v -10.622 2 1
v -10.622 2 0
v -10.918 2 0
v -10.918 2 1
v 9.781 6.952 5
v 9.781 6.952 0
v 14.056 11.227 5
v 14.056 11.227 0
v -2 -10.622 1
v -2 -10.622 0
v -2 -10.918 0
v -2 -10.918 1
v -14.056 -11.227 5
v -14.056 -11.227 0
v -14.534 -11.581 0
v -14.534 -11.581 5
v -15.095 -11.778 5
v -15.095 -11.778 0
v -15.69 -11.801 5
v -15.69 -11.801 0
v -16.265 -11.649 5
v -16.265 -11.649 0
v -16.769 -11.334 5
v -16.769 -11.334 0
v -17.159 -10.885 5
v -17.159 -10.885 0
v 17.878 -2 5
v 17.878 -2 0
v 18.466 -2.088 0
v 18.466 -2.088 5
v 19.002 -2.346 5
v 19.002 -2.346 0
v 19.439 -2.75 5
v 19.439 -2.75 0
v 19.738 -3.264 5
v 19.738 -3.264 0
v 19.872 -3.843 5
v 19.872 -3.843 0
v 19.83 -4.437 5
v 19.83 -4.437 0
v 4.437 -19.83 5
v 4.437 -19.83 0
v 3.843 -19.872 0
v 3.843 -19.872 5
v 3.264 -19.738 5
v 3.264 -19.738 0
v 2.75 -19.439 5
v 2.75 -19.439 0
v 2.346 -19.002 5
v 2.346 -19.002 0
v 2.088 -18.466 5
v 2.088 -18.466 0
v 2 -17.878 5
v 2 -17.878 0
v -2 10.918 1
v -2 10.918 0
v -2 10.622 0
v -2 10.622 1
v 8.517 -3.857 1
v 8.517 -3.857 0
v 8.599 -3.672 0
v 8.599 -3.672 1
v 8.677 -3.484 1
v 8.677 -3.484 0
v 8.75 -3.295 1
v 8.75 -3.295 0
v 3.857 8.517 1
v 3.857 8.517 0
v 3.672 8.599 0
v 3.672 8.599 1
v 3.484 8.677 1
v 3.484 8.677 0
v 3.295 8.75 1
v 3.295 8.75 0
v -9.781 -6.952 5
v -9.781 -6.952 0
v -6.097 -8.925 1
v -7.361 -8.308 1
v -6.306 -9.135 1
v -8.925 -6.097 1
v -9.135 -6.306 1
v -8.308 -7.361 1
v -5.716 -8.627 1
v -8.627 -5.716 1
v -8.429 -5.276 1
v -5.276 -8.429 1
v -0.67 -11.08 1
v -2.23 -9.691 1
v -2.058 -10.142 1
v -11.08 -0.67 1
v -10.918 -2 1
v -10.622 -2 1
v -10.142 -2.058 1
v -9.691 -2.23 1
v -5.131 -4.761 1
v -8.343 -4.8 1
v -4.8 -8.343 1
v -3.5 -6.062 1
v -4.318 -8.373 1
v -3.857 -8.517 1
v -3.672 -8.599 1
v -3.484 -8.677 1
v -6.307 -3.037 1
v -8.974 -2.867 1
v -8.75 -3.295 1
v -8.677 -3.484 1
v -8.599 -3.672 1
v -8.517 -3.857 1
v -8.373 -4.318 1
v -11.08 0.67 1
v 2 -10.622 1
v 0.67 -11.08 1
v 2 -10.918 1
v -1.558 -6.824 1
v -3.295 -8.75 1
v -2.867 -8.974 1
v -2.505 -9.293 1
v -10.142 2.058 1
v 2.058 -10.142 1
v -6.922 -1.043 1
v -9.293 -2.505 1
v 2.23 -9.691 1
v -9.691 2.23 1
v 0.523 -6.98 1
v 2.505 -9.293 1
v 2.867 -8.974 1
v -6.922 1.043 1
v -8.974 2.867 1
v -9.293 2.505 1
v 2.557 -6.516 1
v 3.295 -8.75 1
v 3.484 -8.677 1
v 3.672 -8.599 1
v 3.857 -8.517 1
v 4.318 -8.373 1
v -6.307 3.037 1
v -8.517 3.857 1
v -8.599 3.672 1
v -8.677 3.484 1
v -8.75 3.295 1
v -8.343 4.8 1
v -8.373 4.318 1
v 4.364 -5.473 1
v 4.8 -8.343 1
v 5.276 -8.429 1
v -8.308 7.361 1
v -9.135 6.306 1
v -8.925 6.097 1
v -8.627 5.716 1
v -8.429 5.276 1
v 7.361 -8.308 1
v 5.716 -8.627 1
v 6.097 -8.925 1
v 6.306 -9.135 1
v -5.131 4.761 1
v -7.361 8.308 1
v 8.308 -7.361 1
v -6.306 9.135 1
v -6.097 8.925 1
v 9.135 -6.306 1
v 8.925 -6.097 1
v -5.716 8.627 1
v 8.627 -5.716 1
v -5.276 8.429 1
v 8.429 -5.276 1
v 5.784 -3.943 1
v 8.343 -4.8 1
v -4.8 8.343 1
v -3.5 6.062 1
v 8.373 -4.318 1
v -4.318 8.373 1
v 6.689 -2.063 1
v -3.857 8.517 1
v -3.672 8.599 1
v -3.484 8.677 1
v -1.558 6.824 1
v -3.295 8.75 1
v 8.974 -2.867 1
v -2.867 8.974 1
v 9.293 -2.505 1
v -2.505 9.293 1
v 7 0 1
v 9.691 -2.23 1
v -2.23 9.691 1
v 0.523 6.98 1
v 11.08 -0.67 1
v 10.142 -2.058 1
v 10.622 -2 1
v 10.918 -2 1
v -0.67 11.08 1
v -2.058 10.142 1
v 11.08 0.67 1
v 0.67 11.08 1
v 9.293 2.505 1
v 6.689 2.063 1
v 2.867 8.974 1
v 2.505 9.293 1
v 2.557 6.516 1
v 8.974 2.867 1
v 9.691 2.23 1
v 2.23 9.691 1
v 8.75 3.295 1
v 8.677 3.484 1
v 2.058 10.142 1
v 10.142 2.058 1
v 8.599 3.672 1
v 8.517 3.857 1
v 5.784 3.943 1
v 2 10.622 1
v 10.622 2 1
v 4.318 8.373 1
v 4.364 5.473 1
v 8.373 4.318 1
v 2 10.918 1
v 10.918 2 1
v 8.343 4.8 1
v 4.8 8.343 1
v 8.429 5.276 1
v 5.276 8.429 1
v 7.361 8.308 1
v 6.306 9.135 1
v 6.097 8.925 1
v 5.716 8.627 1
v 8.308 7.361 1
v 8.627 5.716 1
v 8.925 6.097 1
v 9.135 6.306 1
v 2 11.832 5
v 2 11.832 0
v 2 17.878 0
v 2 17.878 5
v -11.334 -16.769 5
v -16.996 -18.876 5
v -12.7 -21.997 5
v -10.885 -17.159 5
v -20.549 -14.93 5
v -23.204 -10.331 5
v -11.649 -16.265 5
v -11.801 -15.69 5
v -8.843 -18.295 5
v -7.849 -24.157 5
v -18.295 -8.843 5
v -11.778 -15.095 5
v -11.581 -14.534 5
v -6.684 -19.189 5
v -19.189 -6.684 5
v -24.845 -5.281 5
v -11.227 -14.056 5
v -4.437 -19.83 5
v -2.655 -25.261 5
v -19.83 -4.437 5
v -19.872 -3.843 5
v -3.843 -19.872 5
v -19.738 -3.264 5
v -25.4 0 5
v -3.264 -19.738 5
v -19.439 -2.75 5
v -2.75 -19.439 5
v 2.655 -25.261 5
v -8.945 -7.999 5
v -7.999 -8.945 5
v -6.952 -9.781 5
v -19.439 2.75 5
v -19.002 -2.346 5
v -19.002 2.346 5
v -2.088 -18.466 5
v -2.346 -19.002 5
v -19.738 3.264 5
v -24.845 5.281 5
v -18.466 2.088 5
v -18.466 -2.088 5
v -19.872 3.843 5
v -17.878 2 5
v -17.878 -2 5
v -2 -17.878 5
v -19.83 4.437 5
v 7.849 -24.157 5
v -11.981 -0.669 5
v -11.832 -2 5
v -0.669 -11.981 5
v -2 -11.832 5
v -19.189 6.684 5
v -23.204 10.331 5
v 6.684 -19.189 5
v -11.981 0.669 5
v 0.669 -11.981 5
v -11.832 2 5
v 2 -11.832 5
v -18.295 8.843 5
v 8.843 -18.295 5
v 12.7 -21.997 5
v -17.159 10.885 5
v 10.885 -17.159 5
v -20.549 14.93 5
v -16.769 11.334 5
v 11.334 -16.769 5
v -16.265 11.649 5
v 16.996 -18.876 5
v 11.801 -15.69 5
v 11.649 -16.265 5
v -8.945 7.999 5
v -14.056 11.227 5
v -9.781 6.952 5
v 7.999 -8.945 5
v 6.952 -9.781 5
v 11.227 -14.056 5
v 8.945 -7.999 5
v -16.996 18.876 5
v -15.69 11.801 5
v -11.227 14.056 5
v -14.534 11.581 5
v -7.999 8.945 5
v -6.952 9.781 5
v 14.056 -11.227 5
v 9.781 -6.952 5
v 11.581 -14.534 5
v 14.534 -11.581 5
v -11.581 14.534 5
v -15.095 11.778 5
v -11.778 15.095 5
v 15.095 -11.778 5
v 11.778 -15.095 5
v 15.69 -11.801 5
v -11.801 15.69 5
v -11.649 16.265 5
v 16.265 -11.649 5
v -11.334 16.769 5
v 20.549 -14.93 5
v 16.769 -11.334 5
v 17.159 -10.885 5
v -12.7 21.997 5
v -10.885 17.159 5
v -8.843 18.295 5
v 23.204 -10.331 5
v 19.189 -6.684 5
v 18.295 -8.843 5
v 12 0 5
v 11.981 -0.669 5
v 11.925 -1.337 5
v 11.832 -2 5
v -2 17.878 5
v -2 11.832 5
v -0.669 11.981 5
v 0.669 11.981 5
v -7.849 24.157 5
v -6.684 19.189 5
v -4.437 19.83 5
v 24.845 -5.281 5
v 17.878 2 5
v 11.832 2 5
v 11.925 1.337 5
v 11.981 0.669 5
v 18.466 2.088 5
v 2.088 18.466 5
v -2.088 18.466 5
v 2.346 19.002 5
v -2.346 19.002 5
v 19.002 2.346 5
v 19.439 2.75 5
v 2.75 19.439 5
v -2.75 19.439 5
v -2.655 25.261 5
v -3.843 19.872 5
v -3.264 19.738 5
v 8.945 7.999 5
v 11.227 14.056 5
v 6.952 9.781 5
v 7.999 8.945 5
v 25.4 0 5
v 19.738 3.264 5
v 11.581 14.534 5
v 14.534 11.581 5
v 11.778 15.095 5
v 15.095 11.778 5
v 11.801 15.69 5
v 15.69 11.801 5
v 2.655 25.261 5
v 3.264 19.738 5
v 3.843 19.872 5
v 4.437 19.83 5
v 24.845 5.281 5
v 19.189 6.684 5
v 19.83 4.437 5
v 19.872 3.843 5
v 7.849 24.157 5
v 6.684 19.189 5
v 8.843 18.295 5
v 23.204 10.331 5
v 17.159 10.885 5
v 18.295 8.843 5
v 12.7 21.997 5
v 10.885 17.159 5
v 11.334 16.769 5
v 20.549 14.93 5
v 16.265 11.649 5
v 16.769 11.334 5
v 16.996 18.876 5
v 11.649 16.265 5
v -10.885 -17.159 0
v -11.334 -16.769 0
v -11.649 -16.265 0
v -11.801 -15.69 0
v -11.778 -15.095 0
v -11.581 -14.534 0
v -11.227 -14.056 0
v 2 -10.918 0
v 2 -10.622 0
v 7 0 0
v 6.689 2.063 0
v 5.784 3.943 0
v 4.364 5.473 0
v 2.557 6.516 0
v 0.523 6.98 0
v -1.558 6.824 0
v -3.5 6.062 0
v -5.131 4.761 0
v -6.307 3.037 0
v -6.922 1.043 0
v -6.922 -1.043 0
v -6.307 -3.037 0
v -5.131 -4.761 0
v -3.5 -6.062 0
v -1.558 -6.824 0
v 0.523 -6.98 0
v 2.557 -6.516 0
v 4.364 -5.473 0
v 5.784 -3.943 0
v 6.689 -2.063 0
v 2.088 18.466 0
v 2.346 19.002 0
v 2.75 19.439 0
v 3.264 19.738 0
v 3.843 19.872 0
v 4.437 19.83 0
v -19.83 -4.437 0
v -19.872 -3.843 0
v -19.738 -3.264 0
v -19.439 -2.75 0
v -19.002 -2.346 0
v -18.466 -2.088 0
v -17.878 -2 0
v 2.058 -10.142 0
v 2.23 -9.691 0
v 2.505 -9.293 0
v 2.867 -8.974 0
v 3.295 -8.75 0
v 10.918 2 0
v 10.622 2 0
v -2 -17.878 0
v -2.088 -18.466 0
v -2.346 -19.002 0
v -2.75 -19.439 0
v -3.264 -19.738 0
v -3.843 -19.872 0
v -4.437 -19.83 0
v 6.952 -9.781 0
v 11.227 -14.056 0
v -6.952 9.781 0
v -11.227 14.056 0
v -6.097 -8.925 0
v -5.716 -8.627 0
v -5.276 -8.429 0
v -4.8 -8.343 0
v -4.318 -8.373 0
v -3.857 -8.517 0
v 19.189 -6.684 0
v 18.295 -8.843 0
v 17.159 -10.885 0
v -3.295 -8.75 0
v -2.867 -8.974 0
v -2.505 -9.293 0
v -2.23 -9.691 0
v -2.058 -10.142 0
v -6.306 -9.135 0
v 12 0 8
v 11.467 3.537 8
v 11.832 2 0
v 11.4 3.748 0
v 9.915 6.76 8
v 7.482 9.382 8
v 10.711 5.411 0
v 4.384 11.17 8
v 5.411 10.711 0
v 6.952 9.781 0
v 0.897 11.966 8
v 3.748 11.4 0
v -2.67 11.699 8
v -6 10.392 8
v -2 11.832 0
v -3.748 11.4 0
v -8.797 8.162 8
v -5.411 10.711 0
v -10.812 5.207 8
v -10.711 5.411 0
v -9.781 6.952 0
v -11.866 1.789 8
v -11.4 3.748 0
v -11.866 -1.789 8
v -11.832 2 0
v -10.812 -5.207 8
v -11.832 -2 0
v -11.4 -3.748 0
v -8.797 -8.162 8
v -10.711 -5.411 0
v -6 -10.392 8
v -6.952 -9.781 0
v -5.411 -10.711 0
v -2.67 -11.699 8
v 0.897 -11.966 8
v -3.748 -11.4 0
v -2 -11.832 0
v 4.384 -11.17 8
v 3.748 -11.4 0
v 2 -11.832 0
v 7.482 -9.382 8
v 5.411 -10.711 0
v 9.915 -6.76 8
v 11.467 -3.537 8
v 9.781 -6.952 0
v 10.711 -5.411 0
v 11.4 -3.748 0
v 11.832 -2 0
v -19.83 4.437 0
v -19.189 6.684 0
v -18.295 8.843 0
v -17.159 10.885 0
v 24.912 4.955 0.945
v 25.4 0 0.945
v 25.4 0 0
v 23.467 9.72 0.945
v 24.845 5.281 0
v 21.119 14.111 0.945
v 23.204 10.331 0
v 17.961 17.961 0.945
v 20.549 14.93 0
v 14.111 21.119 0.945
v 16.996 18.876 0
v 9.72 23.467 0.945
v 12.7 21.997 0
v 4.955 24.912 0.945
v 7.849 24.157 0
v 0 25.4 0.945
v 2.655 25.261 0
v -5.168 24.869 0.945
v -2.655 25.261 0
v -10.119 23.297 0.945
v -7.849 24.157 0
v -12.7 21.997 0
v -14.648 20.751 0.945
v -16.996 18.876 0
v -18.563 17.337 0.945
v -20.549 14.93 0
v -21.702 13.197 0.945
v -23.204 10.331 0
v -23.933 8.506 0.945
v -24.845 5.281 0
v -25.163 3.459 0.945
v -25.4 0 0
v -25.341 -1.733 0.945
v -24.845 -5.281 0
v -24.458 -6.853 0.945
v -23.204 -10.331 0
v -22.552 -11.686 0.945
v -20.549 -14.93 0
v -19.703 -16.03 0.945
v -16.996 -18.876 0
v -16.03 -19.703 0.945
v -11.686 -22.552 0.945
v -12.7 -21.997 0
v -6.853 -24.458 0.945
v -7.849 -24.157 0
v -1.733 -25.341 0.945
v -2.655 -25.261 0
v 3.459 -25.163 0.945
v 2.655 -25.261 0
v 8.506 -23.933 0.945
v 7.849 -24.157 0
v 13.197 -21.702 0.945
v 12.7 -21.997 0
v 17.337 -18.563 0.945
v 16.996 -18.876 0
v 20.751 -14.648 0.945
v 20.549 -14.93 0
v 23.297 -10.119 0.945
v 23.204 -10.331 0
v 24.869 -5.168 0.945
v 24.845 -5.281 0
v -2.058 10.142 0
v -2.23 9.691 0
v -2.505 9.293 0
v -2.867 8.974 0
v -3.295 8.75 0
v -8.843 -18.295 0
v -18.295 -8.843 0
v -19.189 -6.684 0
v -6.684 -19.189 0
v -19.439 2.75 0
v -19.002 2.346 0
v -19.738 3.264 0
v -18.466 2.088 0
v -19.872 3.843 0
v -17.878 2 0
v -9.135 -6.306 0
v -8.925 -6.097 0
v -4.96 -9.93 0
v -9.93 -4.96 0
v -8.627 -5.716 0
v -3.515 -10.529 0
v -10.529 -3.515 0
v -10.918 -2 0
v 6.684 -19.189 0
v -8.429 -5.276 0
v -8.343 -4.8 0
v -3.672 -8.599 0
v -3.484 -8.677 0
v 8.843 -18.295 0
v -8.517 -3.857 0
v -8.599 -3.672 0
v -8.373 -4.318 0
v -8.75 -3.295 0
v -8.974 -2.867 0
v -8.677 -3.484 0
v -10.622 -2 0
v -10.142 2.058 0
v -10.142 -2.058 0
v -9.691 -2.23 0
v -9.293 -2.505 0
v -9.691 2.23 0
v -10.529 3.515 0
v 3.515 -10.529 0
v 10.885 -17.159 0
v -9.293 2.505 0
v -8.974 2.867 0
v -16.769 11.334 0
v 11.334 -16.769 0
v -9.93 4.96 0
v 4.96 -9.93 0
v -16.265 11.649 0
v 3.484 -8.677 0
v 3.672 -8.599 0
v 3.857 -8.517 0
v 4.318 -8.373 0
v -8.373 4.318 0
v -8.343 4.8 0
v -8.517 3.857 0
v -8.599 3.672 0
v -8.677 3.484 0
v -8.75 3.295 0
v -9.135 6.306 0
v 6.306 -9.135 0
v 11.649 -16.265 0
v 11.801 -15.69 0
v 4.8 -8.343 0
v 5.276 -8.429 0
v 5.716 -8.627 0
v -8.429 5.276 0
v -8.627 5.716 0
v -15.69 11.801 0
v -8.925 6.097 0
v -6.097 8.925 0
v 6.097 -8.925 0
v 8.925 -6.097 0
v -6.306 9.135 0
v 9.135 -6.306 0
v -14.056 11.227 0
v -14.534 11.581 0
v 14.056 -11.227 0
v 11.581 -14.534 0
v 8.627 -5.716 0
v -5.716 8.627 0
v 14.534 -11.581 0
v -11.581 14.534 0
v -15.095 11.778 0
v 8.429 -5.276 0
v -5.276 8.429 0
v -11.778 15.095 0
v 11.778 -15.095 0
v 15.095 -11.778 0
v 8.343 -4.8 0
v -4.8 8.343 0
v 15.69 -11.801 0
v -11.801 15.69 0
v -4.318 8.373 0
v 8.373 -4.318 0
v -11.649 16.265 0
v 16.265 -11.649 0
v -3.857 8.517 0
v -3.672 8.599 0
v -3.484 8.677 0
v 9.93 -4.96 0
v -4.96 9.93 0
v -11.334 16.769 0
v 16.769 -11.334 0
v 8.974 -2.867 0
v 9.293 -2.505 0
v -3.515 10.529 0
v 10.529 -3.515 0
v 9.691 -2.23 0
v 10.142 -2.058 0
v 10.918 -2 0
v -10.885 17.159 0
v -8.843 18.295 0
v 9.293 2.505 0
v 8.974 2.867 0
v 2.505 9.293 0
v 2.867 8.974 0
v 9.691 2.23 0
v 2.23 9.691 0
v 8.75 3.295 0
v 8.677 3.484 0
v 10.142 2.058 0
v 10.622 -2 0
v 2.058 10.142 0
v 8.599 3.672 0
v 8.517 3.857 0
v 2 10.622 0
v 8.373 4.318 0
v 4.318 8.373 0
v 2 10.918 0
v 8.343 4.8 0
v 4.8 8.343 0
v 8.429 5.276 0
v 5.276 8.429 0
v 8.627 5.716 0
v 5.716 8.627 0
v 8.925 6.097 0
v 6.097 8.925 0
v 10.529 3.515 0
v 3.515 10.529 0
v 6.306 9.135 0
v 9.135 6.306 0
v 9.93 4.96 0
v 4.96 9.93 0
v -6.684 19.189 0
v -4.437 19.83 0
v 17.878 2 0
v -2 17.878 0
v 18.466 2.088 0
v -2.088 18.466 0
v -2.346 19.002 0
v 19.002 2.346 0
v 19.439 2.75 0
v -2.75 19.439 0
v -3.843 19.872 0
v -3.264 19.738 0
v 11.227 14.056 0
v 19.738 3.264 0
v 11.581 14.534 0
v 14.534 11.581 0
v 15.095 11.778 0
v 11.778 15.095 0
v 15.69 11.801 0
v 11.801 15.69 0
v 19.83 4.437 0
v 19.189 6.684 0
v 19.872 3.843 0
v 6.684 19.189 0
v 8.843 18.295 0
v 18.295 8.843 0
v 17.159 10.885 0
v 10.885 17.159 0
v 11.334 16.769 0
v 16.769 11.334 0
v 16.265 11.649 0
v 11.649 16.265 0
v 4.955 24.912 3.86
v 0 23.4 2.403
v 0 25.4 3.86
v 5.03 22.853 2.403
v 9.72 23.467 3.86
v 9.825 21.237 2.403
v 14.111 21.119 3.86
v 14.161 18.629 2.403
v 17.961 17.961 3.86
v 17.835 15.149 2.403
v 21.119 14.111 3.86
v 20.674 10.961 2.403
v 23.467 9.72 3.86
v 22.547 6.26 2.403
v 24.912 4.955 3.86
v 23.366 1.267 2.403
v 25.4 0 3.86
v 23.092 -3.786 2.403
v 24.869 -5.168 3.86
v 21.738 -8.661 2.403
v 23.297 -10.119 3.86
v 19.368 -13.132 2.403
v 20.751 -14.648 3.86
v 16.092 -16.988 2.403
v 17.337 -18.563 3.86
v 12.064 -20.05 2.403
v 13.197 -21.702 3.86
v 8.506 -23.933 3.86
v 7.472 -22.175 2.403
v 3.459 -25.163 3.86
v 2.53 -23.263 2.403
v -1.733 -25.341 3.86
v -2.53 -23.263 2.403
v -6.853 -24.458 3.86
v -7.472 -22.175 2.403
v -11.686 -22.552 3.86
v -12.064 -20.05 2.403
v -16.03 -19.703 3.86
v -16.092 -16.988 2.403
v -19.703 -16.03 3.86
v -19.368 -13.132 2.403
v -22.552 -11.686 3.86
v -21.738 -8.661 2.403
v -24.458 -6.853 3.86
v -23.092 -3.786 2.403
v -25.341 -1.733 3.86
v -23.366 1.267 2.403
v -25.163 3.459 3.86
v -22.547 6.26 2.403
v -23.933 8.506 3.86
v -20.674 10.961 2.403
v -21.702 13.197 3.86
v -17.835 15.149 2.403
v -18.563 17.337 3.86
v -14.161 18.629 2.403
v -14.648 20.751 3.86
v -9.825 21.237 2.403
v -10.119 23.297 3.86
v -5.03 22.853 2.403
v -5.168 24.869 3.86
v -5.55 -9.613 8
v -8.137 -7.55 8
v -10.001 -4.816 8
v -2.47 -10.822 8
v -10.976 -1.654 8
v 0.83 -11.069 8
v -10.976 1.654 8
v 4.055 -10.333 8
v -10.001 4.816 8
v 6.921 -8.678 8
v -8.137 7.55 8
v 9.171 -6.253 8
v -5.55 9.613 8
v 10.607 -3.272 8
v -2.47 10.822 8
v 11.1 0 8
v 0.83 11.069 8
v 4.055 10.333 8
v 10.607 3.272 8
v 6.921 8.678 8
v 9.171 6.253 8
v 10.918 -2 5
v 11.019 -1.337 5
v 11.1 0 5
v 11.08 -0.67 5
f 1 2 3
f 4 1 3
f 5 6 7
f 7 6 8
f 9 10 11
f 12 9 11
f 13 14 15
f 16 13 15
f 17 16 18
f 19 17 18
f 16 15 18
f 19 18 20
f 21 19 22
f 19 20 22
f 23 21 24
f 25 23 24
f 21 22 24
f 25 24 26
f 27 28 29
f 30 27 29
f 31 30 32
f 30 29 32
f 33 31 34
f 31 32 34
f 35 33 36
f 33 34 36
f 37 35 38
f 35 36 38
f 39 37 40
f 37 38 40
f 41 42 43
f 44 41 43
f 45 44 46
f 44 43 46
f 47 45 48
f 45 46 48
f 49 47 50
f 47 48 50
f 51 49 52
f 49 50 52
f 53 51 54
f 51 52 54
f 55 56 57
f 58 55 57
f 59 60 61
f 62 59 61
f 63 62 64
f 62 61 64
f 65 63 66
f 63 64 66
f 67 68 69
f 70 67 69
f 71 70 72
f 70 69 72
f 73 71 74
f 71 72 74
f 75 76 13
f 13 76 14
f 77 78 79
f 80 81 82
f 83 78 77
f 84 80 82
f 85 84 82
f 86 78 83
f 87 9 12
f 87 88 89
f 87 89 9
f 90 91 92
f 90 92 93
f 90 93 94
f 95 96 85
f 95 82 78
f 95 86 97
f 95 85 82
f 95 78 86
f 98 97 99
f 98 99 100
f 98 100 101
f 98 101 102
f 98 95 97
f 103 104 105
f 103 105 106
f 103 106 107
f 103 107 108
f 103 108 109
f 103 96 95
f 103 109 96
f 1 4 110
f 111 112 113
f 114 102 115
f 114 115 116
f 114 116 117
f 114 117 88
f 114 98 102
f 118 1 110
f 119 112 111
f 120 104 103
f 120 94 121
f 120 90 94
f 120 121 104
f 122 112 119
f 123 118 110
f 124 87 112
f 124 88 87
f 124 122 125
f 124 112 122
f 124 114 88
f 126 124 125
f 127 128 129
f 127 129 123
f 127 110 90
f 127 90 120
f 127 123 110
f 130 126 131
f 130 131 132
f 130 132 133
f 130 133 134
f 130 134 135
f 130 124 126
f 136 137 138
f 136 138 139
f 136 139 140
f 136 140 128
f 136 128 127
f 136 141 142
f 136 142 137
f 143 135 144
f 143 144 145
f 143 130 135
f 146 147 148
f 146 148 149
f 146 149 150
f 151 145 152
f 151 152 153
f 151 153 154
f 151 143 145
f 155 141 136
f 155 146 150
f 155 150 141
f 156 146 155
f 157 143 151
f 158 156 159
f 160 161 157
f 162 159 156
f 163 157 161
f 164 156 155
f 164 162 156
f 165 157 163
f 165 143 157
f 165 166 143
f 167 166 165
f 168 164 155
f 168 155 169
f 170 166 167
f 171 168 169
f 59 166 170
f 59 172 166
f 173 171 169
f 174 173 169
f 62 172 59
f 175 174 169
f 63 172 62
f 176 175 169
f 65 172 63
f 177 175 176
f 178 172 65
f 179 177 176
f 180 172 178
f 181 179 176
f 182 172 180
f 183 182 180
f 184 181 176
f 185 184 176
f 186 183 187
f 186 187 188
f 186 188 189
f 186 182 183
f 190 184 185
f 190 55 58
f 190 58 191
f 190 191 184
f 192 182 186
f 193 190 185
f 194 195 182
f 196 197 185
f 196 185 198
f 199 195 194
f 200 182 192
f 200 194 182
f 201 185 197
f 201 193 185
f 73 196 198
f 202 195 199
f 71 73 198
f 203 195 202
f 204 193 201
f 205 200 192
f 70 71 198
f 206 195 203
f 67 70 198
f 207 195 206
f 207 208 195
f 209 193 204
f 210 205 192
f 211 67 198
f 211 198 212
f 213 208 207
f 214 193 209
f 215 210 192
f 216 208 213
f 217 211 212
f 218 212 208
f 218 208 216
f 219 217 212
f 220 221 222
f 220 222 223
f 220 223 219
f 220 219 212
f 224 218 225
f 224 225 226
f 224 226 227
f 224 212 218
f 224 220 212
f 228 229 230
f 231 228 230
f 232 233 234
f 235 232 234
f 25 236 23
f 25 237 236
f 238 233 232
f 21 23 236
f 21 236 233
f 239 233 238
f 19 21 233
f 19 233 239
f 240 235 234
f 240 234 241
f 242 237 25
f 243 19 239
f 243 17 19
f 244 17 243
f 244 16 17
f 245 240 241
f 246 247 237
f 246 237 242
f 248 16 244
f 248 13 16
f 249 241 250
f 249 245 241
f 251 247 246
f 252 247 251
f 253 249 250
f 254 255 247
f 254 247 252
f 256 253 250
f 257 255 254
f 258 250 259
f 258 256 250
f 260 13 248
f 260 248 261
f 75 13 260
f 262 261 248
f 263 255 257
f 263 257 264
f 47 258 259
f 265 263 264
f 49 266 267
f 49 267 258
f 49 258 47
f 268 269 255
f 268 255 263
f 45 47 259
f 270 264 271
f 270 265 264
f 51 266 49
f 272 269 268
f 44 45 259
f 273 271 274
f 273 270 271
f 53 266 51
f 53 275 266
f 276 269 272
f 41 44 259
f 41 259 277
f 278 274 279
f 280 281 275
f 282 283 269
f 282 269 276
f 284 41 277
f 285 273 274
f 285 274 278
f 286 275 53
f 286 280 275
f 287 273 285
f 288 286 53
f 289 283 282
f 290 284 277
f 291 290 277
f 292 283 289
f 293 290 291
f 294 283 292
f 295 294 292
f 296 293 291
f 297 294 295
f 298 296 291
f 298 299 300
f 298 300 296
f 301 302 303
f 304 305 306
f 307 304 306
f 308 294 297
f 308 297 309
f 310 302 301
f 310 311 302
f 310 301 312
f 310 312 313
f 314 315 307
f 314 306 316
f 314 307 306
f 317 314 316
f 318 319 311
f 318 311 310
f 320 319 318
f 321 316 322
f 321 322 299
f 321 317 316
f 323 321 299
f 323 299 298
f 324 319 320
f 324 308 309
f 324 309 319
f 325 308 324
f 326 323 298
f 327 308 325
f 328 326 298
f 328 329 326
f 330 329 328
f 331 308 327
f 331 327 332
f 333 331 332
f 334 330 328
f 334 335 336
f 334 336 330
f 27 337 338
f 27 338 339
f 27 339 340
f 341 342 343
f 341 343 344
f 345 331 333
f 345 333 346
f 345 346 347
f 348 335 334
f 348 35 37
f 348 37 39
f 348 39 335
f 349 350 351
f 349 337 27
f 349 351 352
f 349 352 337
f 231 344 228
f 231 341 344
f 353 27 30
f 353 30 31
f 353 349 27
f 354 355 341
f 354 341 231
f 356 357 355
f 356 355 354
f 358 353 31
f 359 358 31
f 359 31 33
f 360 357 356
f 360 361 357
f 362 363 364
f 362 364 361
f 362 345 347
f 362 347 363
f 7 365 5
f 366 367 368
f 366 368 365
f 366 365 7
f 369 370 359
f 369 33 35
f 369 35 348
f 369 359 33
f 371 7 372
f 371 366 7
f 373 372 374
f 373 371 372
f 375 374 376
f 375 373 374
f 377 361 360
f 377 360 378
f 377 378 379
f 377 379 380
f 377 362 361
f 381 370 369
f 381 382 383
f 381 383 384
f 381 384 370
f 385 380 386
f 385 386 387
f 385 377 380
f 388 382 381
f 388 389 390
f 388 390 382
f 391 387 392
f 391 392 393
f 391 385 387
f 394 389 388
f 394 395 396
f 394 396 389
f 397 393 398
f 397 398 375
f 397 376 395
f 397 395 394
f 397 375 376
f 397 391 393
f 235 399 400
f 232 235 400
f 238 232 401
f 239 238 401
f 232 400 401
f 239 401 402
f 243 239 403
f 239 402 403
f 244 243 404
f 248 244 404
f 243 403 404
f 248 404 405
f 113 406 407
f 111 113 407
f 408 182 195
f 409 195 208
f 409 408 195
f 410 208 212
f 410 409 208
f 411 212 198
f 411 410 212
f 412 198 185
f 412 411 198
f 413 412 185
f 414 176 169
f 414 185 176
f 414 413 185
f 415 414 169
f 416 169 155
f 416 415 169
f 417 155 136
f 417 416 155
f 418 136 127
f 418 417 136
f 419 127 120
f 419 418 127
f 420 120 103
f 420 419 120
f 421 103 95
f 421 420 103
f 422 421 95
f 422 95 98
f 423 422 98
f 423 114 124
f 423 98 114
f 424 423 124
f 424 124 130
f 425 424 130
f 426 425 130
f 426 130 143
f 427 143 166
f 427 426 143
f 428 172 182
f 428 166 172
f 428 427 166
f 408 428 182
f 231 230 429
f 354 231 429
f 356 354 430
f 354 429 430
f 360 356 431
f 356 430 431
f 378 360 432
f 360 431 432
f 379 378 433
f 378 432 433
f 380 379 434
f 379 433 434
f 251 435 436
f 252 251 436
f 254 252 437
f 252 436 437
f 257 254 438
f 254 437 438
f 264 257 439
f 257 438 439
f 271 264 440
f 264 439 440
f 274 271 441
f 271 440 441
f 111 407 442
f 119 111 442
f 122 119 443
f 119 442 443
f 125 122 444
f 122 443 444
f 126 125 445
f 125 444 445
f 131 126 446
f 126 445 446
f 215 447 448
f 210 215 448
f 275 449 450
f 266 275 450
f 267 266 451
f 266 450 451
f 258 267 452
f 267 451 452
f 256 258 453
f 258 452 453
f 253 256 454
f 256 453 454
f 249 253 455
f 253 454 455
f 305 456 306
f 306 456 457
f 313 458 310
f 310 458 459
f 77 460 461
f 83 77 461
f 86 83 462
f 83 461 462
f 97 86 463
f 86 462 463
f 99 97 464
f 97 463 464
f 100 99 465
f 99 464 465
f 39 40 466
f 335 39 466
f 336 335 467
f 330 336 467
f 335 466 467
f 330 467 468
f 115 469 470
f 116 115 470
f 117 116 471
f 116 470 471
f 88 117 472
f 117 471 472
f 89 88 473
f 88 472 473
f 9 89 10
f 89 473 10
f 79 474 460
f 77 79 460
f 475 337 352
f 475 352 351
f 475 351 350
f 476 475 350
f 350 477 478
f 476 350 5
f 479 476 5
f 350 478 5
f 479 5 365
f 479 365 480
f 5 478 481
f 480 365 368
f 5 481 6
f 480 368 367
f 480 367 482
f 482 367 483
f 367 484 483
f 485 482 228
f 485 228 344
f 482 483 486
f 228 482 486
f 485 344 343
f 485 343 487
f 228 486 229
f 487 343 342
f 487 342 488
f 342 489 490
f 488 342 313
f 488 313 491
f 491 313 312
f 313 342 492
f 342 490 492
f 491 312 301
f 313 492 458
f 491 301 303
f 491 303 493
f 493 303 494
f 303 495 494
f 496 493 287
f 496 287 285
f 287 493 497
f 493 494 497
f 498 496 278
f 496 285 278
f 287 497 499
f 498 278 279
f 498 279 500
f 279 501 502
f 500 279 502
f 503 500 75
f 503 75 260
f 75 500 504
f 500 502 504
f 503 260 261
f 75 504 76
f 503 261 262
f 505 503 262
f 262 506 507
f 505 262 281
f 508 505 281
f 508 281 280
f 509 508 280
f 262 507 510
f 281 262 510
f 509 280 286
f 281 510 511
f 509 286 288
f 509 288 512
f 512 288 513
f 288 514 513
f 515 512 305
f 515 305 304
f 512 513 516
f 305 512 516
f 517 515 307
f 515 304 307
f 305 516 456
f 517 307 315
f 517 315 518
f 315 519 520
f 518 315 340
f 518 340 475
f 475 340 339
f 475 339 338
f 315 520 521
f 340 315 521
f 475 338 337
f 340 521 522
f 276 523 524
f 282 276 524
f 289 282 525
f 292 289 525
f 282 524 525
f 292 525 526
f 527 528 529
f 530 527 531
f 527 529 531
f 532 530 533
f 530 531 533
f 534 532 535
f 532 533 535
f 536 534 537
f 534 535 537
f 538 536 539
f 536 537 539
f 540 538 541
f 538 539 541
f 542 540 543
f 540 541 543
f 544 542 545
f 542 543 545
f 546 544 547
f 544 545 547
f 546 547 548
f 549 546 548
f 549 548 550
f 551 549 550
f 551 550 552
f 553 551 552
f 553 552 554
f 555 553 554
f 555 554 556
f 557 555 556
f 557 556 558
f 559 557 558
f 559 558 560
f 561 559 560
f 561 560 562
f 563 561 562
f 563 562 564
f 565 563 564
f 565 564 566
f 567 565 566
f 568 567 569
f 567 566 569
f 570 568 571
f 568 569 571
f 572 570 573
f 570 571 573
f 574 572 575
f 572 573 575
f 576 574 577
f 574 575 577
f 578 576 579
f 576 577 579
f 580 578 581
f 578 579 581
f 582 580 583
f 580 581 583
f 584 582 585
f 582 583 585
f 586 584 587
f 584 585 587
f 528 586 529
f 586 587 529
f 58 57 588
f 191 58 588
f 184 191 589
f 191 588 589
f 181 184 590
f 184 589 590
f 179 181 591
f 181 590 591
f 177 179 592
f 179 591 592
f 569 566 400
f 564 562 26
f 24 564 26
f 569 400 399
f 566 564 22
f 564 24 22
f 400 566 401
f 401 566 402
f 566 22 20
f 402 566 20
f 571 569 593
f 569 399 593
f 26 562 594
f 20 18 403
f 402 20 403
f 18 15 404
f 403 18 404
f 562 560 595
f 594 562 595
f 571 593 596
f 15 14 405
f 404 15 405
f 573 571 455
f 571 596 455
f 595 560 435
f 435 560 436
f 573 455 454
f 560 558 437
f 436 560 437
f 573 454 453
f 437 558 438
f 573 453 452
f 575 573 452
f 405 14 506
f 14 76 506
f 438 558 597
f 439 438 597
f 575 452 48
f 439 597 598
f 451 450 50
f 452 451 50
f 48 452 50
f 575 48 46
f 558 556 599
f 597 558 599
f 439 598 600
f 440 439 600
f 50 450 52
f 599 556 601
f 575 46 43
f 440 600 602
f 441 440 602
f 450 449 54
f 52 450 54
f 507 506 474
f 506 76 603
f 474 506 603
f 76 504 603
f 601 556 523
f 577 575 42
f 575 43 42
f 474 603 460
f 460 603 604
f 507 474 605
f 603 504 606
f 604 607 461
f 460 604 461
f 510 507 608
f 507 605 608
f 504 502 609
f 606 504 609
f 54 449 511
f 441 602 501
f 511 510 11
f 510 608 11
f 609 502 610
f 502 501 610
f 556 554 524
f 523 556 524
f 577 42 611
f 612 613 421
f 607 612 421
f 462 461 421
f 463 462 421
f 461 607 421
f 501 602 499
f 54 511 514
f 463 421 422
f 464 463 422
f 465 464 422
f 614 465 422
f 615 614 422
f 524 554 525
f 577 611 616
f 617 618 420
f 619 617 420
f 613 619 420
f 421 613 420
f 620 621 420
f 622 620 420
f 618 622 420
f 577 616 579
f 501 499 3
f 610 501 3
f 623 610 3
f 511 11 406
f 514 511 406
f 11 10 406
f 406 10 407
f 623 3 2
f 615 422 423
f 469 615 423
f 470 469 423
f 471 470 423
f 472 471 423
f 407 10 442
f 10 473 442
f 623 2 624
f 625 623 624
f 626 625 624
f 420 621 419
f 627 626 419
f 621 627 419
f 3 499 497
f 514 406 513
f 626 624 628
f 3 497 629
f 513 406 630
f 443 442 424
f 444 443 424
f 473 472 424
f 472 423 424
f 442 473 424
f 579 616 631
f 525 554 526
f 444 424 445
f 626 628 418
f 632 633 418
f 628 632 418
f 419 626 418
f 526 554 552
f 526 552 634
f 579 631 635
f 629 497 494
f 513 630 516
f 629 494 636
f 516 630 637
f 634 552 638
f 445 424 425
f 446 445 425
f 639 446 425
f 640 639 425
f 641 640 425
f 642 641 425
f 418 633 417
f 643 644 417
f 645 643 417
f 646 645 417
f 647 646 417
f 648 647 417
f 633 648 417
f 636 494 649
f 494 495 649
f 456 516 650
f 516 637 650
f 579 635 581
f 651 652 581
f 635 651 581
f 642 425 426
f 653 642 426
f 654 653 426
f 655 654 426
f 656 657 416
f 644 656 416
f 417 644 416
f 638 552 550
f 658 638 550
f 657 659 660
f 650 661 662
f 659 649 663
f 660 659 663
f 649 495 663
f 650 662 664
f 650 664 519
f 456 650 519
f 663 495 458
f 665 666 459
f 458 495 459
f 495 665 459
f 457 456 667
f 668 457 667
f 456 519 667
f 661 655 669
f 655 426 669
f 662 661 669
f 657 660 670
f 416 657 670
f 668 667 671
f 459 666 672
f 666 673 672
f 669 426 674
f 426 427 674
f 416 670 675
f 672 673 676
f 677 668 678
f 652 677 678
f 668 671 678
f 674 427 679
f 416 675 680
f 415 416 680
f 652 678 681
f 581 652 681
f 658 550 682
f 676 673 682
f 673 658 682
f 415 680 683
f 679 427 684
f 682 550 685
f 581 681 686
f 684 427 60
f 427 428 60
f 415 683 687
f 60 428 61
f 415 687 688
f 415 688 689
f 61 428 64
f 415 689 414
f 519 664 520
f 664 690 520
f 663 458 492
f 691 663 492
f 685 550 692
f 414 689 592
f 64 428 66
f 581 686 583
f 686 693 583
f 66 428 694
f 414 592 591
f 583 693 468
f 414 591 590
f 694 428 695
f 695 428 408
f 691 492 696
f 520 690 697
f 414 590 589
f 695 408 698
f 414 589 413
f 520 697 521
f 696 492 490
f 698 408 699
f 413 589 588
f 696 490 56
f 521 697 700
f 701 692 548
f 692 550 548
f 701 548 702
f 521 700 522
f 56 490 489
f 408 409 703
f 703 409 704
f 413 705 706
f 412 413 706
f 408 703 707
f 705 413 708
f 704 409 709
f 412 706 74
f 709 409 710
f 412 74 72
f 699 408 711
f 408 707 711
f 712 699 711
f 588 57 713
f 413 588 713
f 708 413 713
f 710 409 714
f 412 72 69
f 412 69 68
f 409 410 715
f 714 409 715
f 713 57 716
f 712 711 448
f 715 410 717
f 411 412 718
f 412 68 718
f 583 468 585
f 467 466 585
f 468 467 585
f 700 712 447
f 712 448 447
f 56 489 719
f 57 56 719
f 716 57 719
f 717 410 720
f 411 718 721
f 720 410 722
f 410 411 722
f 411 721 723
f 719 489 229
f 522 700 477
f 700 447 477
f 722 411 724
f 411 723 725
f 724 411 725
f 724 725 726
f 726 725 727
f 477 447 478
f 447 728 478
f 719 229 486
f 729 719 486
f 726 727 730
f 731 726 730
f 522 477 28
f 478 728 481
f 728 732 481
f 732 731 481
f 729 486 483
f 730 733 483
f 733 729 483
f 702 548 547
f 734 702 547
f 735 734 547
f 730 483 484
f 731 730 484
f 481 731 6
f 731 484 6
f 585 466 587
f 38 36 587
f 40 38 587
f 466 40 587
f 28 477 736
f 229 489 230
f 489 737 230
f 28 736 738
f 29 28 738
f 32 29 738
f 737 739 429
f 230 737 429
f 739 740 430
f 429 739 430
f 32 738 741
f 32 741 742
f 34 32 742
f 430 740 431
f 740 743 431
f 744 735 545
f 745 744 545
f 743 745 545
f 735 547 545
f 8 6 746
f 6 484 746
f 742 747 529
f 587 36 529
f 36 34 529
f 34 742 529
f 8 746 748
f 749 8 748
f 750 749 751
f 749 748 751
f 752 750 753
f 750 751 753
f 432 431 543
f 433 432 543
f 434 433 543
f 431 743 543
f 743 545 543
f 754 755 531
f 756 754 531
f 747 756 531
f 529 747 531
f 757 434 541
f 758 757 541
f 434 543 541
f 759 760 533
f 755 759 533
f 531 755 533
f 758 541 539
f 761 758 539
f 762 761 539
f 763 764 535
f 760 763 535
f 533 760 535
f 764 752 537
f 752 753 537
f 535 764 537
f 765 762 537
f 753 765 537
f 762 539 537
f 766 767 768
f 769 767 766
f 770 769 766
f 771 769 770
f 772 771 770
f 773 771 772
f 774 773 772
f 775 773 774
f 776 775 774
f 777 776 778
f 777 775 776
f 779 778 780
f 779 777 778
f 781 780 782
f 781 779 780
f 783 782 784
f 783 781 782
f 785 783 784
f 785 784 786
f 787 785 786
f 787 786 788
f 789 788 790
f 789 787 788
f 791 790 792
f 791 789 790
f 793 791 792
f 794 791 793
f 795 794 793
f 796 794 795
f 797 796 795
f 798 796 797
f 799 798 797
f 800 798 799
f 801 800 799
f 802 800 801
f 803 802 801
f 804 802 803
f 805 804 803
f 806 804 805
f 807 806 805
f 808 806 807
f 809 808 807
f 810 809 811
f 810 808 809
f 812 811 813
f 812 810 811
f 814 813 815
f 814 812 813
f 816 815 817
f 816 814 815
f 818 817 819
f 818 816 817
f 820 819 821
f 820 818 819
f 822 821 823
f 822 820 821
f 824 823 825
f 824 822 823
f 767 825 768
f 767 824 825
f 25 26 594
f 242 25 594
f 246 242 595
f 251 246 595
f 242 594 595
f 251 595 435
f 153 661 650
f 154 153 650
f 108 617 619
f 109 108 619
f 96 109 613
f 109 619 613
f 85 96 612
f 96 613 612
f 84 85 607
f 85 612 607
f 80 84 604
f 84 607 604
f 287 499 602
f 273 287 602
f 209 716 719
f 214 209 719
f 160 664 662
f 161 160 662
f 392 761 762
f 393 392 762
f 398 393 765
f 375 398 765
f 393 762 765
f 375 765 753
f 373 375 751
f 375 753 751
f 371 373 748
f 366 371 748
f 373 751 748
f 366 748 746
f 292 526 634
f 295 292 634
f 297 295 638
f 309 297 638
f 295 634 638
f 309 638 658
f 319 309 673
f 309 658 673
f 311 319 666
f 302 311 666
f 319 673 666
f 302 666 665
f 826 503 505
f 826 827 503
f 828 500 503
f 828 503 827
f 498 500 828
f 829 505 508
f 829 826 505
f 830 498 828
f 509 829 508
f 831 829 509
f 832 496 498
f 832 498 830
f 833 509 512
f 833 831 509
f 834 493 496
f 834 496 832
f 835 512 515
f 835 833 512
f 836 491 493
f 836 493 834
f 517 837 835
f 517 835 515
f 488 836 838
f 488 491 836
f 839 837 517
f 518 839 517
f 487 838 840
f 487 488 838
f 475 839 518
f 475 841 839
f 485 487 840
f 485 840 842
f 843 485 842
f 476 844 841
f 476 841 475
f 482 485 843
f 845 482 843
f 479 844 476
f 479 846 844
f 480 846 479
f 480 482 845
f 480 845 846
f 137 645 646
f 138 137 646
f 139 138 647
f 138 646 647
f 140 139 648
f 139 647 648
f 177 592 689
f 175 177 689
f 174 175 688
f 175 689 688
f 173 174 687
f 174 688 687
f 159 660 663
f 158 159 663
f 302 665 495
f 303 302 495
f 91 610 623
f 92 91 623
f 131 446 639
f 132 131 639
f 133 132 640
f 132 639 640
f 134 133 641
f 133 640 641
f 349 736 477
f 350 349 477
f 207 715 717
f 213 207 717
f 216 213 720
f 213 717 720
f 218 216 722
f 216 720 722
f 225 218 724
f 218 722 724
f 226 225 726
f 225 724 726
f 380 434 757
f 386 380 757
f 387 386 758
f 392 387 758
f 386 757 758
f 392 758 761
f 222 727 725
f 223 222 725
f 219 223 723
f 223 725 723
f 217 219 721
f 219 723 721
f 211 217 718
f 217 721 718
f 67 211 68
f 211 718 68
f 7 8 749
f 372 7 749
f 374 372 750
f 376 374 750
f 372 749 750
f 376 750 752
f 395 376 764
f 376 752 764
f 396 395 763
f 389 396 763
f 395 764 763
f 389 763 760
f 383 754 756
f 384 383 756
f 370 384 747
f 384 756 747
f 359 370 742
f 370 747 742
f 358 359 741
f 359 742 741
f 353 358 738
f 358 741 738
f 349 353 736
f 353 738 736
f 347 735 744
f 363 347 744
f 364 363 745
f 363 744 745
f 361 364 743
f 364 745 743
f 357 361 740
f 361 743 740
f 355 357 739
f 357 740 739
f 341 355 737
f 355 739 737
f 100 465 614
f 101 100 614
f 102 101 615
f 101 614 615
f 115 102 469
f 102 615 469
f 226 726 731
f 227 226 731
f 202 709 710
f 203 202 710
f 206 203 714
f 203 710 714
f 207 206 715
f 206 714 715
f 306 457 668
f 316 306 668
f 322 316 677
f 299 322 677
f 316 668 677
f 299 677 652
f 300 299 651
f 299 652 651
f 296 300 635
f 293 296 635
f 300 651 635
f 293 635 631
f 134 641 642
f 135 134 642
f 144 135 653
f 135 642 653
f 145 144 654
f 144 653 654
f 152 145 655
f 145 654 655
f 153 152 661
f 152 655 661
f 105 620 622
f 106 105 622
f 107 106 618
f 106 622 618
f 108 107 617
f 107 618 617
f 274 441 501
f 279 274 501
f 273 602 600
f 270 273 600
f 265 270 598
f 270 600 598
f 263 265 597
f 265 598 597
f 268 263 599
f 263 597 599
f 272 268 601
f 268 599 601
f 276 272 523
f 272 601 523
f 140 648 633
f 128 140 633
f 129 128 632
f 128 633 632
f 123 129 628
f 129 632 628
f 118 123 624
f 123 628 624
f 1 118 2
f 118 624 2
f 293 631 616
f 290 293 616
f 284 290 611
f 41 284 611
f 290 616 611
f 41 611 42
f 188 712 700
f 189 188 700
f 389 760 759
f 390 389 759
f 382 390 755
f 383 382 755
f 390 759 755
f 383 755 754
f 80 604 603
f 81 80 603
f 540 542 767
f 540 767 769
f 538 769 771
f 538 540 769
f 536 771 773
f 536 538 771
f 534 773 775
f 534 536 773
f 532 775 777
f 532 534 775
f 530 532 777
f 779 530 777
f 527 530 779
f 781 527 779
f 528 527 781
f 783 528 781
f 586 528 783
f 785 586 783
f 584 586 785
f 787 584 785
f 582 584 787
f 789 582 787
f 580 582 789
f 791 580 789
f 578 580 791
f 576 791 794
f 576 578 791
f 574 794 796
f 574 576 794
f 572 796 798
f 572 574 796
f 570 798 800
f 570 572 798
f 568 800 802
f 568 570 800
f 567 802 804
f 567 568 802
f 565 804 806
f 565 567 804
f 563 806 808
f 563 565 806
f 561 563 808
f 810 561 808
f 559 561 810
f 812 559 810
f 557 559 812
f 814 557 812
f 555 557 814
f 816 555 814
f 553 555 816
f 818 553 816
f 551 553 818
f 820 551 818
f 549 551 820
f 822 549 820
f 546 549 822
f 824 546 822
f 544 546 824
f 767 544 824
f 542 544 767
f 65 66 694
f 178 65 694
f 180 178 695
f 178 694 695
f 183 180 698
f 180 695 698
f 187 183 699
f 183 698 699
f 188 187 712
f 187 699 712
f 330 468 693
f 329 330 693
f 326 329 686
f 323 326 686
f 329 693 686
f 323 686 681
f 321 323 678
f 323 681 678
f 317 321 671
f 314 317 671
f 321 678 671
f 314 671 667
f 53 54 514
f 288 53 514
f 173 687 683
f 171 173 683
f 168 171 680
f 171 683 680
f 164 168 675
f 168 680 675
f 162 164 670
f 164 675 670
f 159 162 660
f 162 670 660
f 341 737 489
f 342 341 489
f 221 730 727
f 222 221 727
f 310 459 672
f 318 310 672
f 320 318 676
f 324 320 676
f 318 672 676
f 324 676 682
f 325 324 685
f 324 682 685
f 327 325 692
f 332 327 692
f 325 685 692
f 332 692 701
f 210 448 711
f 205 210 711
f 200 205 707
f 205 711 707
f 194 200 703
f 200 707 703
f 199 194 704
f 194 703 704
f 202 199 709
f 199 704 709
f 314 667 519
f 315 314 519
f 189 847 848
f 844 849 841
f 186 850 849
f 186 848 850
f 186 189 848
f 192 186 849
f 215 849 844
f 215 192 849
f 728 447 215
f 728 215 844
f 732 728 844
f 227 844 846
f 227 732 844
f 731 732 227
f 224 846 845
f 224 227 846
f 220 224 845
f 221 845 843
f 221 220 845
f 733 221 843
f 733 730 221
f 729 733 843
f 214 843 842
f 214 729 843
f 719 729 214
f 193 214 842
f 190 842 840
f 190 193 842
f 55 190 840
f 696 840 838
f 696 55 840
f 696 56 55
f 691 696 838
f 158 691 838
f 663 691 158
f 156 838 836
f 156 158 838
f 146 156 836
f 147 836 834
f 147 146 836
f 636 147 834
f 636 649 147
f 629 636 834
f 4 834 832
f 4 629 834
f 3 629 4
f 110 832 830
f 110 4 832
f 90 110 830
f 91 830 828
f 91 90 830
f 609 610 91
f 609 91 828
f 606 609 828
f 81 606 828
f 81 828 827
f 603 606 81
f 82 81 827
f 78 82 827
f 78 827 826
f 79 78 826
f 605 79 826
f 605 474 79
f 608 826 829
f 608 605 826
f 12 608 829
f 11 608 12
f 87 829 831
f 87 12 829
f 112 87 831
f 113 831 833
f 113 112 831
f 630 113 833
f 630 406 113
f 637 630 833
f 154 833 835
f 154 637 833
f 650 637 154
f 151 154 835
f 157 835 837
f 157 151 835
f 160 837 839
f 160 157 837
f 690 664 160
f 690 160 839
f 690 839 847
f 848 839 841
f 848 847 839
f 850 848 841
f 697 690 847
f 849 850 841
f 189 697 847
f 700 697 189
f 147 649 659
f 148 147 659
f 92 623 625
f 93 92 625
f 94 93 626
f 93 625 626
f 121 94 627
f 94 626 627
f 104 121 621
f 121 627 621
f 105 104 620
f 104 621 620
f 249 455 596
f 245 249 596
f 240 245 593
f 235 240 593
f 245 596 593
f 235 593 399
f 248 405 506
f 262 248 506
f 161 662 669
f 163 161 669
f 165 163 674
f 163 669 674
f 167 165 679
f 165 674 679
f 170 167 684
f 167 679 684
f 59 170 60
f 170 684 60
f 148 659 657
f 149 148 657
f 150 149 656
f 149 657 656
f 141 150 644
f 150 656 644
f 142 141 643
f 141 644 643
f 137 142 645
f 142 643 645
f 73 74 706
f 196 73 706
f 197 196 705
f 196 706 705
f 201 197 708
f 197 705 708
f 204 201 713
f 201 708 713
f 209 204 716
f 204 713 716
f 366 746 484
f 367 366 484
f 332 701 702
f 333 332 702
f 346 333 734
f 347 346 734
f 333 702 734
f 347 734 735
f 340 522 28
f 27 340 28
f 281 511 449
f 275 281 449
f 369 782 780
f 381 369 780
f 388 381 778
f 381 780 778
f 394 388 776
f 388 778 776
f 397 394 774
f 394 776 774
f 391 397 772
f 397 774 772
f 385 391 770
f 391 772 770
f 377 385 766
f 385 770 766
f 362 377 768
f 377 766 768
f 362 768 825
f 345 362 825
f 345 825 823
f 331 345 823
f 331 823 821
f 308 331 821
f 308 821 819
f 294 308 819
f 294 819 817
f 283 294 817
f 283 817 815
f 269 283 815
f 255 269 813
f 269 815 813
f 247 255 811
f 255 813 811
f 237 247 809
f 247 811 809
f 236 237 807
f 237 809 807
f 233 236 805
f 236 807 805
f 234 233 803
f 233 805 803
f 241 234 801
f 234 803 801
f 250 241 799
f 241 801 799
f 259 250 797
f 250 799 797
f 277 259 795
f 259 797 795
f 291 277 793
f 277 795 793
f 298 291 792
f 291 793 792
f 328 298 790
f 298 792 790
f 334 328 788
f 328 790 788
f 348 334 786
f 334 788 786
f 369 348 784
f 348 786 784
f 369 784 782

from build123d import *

# Parameters (mm, degrees)
F0_R      = 25.4
F0_R_2    = 3
F1_DEPTH  = 5
F2_R      = 12
F2_R_2    = 11.1
F3_DEPTH  = 8
F4_R      = 3
F5_DEPTH  = 8.001
F9_DEPTH  = 4
F8_R      = 7
F10_DEPTH = 8.001


with BuildPart() as f1:
    # F0 (on Top) → F1 (new body)
    with BuildSketch(Plane.XY):
        Circle(F0_R)
        with BuildLine():
            ThreePointArc((-10.8845303834, -17.1589451405), (-11.8011180453, -15.6897422321), (-11.2274319001, -14.0558590249))
            Line((-11.2274319001, -14.0558590249), (-6.0965287445, -8.9249558692))
            ThreePointArc((-6.0965287445, -8.9249558692), (-5.0405306234, -8.3715104933), (-3.857237617, -8.5172893555))
            ThreePointArc((-3.857237617, -8.5172893555), (-3.5780900926, -8.638273629), (-3.295154185, -8.7501119363))
            ThreePointArc((-3.295154185, -8.7501119363), (-2.355358454, -9.4837452232), (-2, -10.6217936338))
            Line((-2, -10.6217936338), (-2, -17.8779864638))
            ThreePointArc((-2, -17.8779864638), (-2.749672532, -19.4389737228), (-4.4366812227, -19.8297317109))
            ThreePointArc((-4.4366812227, -19.8297317109), (-7.7761273457, -18.7732321006), (-10.8845303834, -17.1589451405))
        make_face(mode=Mode.SUBTRACT)
        with BuildLine():
            ThreePointArc((-19.8297317109, -4.4366812227), (-19.4389737228, -2.749672532), (-17.8779864638, -2))
            Line((-17.8779864638, -2), (-10.6217936338, -2))
            ThreePointArc((-10.6217936338, -2), (-9.4837452232, -2.355358454), (-8.7501119363, -3.295154185))
            ThreePointArc((-8.7501119363, -3.295154185), (-8.638273629, -3.5780900926), (-8.5172893555, -3.857237617))
            ThreePointArc((-8.5172893555, -3.857237617), (-8.3715104933, -5.0405306234), (-8.9249558692, -6.0965287445))
            Line((-8.9249558692, -6.0965287445), (-14.0558590249, -11.2274319001))
            ThreePointArc((-14.0558590249, -11.2274319001), (-15.6897422321, -11.8011180453), (-17.1589451405, -10.8845303834))
            ThreePointArc((-17.1589451405, -10.8845303834), (-18.7732321006, -7.7761273457), (-19.8297317109, -4.4366812227))
        make_face(mode=Mode.SUBTRACT)
        Circle(F0_R_2, mode=Mode.SUBTRACT)
        with BuildLine():
            ThreePointArc((4.4366812227, -19.8297317109), (2.749672532, -19.4389737228), (2, -17.8779864638))
            Line((2, -17.8779864638), (2, -10.6217936338))
            ThreePointArc((2, -10.6217936338), (2.355358454, -9.4837452232), (3.295154185, -8.7501119363))
            ThreePointArc((3.295154185, -8.7501119363), (3.5780900926, -8.638273629), (3.857237617, -8.5172893555))
            ThreePointArc((3.857237617, -8.5172893555), (5.0405306234, -8.3715104933), (6.0965287445, -8.9249558692))
            Line((6.0965287445, -8.9249558692), (11.2274319001, -14.0558590249))
            ThreePointArc((11.2274319001, -14.0558590249), (11.8011180453, -15.6897422321), (10.8845303834, -17.1589451405))
            ThreePointArc((10.8845303834, -17.1589451405), (7.7761273457, -18.7732321006), (4.4366812227, -19.8297317109))
        make_face(mode=Mode.SUBTRACT)
        with BuildLine():
            ThreePointArc((17.1589451405, -10.8845303834), (15.6897422321, -11.8011180453), (14.0558590249, -11.2274319001))
            Line((14.0558590249, -11.2274319001), (8.9249558692, -6.0965287445))
            ThreePointArc((8.9249558692, -6.0965287445), (8.3715104933, -5.0405306234), (8.5172893555, -3.857237617))
            ThreePointArc((8.5172893555, -3.857237617), (8.638273629, -3.5780900926), (8.7501119363, -3.295154185))
            ThreePointArc((8.7501119363, -3.295154185), (9.4837452232, -2.355358454), (10.6217936338, -2))
            Line((10.6217936338, -2), (17.8779864638, -2))
            ThreePointArc((17.8779864638, -2), (19.4389737228, -2.749672532), (19.8297317109, -4.4366812227))
            ThreePointArc((19.8297317109, -4.4366812227), (18.7732321006, -7.7761273457), (17.1589451405, -10.8845303834))
        make_face(mode=Mode.SUBTRACT)
        with BuildLine():
            ThreePointArc((-17.1589451405, 10.8845303834), (-15.6897422321, 11.8011180453), (-14.0558590249, 11.2274319001))
            Line((-14.0558590249, 11.2274319001), (-8.9249558692, 6.0965287445))
            ThreePointArc((-8.9249558692, 6.0965287445), (-8.3715104933, 5.0405306234), (-8.5172893555, 3.857237617))
            ThreePointArc((-8.5172893555, 3.857237617), (-8.638273629, 3.5780900926), (-8.7501119363, 3.295154185))
            ThreePointArc((-8.7501119363, 3.295154185), (-9.4837452232, 2.355358454), (-10.6217936338, 2))
            Line((-10.6217936338, 2), (-17.8779864638, 2))
            ThreePointArc((-17.8779864638, 2), (-19.4389737228, 2.749672532), (-19.8297317109, 4.4366812227))
            ThreePointArc((-19.8297317109, 4.4366812227), (-18.7732321006, 7.7761273457), (-17.1589451405, 10.8845303834))
        make_face(mode=Mode.SUBTRACT)
        with BuildLine():
            ThreePointArc((-10.8845303834, 17.1589451405), (-7.7761273457, 18.7732321006), (-4.4366812227, 19.8297317109))
            ThreePointArc((-4.4366812227, 19.8297317109), (-2.749672532, 19.4389737228), (-2, 17.8779864638))
            Line((-2, 17.8779864638), (-2, 10.6217936338))
            ThreePointArc((-2, 10.6217936338), (-2.355358454, 9.4837452232), (-3.295154185, 8.7501119363))
            ThreePointArc((-3.295154185, 8.7501119363), (-3.5780900926, 8.638273629), (-3.857237617, 8.5172893555))
            ThreePointArc((-3.857237617, 8.5172893555), (-5.0405306234, 8.3715104933), (-6.0965287445, 8.9249558692))
            Line((-6.0965287445, 8.9249558692), (-11.2274319001, 14.0558590249))
            ThreePointArc((-11.2274319001, 14.0558590249), (-11.8011180453, 15.6897422321), (-10.8845303834, 17.1589451405))
        make_face(mode=Mode.SUBTRACT)
        with BuildLine():
            ThreePointArc((19.8297317109, 4.4366812227), (19.4389737228, 2.749672532), (17.8779864638, 2))
            Line((17.8779864638, 2), (10.6217936338, 2))
            ThreePointArc((10.6217936338, 2), (9.4837452232, 2.355358454), (8.7501119363, 3.295154185))
            ThreePointArc((8.7501119363, 3.295154185), (8.638273629, 3.5780900926), (8.5172893555, 3.857237617))
            ThreePointArc((8.5172893555, 3.857237617), (8.3715104933, 5.0405306234), (8.9249558692, 6.0965287445))
            Line((8.9249558692, 6.0965287445), (14.0558590249, 11.2274319001))
            ThreePointArc((14.0558590249, 11.2274319001), (15.6897422321, 11.8011180453), (17.1589451405, 10.8845303834))
            ThreePointArc((17.1589451405, 10.8845303834), (18.7732321006, 7.7761273457), (19.8297317109, 4.4366812227))
        make_face(mode=Mode.SUBTRACT)
        with BuildLine():
            Line((2, 10.6217936338), (2, 17.8779864638))
            ThreePointArc((2, 17.8779864638), (2.749672532, 19.4389737228), (4.4366812227, 19.8297317109))
            ThreePointArc((4.4366812227, 19.8297317109), (7.7761273457, 18.7732321006), (10.8845303834, 17.1589451405))
            ThreePointArc((10.8845303834, 17.1589451405), (11.8011180453, 15.6897422321), (11.2274319001, 14.0558590249))
            Line((11.2274319001, 14.0558590249), (6.0965287445, 8.9249558692))
            ThreePointArc((6.0965287445, 8.9249558692), (5.0405306234, 8.3715104933), (3.857237617, 8.5172893555))
            ThreePointArc((3.857237617, 8.5172893555), (3.5780900926, 8.638273629), (3.295154185, 8.7501119363))
            ThreePointArc((3.295154185, 8.7501119363), (2.355358454, 9.4837452232), (2, 10.6217936338))
        make_face(mode=Mode.SUBTRACT)
    extrude(amount=F1_DEPTH)

    # F2 (on Top) → F3 (join)
    with BuildSketch(Plane.XY):
        Circle(F2_R)
        Circle(F2_R_2, mode=Mode.SUBTRACT)
    extrude(amount=F3_DEPTH)

    # F4 (on face) → F5 (cut, through all)
    with BuildSketch(Plane.XY.offset(8)):
        Circle(F4_R)
    extrude(amount=-F5_DEPTH, mode=Mode.SUBTRACT)

    # F6 (on Right) → F7 (revolve, cut)
    with BuildSketch(Plane.YZ):
        Polygon((25.4579713509, 0.9026185274), (25.4, 2.4026185274), (23.4, 2.4026185274), align=None)
        Polygon((23.4, 2.4026185274), (25.4, 2.4026185274), (25.4579713509, 3.9026185274), align=None)
    revolve(axis=Axis((0, 0, 8.0988456029), (0, 0, -1)), mode=Mode.SUBTRACT)

    # F9 (cut): a face of the model
    f9_faces = [f1.faces().sort_by_distance(p)[0] for p in [
        (-7.6268852712, -7.6268852712, 5),
    ]]
    extrude(f9_faces, amount=-F9_DEPTH, mode=Mode.SUBTRACT)

    # F8 (on Top) → F10 (cut, through all)
    with BuildSketch(Plane.XY):
        Circle(F8_R)
    extrude(amount=F10_DEPTH, mode=Mode.SUBTRACT)


solid = f1.part
